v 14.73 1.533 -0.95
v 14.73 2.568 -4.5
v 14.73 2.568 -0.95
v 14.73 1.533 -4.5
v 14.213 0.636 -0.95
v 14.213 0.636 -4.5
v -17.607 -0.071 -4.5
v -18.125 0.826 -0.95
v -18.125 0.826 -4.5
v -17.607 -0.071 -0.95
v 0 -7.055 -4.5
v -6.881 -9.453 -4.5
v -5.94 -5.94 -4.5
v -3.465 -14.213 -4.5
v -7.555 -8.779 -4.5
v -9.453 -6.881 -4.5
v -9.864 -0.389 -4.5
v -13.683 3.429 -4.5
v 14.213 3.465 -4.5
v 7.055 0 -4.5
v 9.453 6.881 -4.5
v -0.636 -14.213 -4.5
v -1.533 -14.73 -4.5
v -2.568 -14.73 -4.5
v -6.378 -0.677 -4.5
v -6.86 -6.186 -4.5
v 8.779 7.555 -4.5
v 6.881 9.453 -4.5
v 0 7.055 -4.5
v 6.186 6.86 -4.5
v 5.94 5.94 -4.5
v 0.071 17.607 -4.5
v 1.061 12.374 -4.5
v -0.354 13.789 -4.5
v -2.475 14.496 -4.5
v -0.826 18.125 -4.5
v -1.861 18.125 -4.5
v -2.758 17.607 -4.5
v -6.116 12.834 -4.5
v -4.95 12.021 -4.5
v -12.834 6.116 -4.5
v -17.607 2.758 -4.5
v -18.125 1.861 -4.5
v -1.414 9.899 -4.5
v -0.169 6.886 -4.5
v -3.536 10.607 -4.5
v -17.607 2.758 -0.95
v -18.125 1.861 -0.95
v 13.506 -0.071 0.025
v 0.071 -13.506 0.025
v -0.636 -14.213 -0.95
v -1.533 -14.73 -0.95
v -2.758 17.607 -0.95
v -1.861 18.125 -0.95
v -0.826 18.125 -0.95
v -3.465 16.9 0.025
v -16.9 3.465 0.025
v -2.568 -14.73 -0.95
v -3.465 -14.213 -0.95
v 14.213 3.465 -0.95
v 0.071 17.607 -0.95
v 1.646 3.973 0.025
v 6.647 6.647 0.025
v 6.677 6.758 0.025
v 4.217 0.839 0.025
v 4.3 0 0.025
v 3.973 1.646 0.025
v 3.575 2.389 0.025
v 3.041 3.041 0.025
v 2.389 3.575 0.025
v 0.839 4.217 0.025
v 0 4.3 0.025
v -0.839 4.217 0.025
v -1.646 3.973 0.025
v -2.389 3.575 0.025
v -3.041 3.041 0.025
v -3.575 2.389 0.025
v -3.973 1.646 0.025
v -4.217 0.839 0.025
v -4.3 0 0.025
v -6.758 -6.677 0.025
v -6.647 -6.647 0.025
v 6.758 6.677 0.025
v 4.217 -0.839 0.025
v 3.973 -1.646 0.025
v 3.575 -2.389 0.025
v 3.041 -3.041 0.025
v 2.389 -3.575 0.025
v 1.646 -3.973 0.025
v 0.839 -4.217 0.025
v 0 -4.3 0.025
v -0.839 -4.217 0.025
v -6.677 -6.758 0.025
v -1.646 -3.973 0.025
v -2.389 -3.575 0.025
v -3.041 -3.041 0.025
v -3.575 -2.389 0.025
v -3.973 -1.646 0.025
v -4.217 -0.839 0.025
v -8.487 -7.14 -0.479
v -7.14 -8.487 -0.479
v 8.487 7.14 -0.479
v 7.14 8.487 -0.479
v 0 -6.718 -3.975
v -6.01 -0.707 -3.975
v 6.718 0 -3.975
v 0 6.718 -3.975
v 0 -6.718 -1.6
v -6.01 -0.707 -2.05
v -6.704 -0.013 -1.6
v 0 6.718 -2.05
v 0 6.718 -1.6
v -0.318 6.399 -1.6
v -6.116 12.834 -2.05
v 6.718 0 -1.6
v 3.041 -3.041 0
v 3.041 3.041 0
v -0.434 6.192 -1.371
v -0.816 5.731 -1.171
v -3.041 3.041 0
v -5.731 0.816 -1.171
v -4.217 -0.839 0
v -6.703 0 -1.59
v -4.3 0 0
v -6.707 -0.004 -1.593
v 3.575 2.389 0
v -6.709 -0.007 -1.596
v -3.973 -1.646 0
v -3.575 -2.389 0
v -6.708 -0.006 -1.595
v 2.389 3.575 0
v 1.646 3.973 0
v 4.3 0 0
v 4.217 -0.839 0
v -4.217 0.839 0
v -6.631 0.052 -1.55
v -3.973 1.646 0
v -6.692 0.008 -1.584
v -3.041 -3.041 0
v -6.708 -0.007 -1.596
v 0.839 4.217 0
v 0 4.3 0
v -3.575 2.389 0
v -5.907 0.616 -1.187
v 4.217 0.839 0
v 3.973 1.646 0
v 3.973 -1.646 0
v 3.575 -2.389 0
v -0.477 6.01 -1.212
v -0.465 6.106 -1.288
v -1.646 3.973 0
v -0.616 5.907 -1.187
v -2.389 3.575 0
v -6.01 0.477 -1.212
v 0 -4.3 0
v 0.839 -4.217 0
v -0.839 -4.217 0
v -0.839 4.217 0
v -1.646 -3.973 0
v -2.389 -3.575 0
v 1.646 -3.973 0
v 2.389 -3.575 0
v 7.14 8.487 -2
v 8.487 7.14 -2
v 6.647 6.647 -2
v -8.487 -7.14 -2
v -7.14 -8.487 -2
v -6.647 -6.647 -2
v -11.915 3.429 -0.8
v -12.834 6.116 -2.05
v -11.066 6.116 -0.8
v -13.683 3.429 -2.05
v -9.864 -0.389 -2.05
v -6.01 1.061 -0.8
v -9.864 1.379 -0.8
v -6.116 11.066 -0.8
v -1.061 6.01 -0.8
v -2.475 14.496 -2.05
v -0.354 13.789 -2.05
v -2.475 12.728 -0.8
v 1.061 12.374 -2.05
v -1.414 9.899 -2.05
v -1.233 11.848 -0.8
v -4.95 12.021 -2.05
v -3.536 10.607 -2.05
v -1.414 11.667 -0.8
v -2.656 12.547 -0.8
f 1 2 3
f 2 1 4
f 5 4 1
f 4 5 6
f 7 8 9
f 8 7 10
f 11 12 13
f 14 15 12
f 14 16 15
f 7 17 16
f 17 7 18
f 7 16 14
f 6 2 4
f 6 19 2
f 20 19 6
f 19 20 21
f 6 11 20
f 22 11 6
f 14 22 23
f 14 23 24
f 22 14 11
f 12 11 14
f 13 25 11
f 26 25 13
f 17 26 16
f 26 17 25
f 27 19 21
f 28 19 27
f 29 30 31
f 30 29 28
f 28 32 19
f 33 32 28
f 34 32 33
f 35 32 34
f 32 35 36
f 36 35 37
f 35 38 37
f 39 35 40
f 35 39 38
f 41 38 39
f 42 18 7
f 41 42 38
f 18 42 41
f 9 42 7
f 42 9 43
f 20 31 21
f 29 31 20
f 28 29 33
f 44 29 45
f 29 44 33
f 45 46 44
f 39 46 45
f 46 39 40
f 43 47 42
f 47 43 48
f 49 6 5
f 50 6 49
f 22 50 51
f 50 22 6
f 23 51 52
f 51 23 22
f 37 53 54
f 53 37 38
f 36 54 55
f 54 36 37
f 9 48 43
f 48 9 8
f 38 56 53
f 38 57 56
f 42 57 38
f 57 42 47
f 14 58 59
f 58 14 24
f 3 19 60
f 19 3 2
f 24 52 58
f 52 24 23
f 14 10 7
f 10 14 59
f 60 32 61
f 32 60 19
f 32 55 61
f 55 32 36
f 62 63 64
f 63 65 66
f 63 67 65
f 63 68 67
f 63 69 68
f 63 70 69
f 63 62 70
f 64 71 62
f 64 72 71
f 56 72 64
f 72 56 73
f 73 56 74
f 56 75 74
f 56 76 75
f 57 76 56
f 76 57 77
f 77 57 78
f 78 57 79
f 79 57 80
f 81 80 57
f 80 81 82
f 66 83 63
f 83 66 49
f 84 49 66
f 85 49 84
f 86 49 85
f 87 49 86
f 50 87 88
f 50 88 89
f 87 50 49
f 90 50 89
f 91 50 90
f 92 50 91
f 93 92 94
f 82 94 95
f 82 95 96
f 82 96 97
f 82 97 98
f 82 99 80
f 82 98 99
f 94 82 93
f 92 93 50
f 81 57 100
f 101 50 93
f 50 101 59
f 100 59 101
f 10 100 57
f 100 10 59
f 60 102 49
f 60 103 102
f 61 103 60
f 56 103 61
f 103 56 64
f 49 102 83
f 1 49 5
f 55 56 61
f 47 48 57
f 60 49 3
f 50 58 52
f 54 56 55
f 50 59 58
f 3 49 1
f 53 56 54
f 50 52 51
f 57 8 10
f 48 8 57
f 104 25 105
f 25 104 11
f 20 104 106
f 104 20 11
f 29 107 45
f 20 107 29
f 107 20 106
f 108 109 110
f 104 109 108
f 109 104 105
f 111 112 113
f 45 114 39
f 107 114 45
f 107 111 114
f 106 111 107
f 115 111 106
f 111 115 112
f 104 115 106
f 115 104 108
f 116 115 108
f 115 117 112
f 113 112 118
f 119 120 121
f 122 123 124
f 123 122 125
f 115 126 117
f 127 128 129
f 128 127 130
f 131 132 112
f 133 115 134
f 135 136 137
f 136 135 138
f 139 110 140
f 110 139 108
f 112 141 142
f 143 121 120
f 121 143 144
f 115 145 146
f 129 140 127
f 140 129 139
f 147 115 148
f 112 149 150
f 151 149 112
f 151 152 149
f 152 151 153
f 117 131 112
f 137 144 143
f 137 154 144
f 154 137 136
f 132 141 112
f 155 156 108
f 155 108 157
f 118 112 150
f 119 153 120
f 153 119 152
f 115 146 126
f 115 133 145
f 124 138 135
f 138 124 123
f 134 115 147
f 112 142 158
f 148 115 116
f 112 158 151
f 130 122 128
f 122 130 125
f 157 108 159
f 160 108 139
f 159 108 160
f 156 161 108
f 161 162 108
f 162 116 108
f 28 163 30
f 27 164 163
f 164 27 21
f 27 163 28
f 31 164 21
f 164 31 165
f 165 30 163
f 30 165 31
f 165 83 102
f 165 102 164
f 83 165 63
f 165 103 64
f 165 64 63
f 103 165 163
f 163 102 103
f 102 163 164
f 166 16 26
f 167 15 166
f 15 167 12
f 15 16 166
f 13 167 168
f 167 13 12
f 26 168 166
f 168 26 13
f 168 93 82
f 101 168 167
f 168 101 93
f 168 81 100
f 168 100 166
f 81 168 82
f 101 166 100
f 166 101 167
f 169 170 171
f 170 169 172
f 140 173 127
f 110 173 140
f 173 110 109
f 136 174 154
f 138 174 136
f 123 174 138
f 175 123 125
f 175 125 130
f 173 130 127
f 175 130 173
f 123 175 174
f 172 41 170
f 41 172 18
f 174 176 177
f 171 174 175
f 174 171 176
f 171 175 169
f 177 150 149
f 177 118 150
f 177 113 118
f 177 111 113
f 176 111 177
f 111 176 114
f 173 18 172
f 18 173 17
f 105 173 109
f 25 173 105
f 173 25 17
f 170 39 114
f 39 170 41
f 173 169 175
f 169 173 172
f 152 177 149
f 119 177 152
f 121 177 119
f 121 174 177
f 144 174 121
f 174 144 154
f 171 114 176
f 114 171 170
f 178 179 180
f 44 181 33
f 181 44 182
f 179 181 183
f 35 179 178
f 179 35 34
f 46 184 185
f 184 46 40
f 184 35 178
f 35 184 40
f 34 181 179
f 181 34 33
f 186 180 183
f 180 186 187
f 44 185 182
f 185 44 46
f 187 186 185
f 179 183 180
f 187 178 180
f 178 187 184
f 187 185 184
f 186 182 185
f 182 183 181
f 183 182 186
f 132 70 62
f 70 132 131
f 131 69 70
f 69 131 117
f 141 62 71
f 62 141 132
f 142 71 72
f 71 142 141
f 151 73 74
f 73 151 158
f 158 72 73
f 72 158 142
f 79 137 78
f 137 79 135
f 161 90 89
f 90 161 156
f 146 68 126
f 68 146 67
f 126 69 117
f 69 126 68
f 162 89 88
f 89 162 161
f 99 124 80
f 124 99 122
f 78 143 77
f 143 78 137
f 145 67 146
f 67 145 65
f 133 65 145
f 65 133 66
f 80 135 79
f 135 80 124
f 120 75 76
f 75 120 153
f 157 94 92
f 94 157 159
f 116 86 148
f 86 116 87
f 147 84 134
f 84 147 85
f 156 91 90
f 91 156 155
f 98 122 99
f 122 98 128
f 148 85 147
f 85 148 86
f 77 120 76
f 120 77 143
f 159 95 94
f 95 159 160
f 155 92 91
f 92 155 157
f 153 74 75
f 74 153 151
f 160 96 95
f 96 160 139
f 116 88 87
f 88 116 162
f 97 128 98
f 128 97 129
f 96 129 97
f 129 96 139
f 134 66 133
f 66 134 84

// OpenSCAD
// file: 6led.scad
/******************************************************************
*                                                                 *
* OpenFlexure Microscope: USB camera push-fit mount               *
*                                                                 *
* This is part of the OpenFlexure microscope, an open-source      *
* microscope and 3-axis translation stage.  It gets really good   *
* precision over a ~10mm range, by using plastic flexure          *
* mechanisms.                                                     *
*                                                                 *
* This file defines one useful function, usbcam_push_fit().  It's *
* designed to be subtracted from a solid block, with the bottom   *
* of the block at z=0.  It grips the plastic camera housing with  *
* a "trylinder" gripper, holding it in securely.  It might be     *
* that you need a cover or something to secure the camera fully.  *
*                                                                 *
* (c) Richard Bowman, January 2016                                *
* Released under the CERN Open Hardware License                   *
*                                                                 *
******************************************************************/


use <../utilities.scad>;
use <./m12.scad>;

// Camera geometry (mostly of the bottom of the lens mount)
lens_holder_tube_r = 13.5/2; // the tube into which the lens screws
lens_holder_tube_h = 12.6; // the height of the tube above the PCB
lens_holder_clearance = 0.35; // extra space around the camera to make sure it fits
lens_holder_box_h = 3.6;
lens_holder_box = [2,2,0] * lens_holder_tube_r + [0,0,1] * lens_holder_box_h; // box at the bottom of the tube
lens_holder_mounting_screw_y = 9; // position of the lugs for mounting screws
lens_holder_mounting_screw_lug_r = 2.2; // size of above.
camera_component_clearance = 1; // it's easiest to have the PCB slightly below the mount

d=0.05; //small distance!
$fn=32;

function 6led_camera_sensor_height() = m12_camera_sensor_height(); //Height of the sensor above the PCB


module 6led_lens_mount(){
    m12_lens_mount();
}


function 6led_camera_mount_height()=m12_camera_mount_height();

module 6led_camera_mount(){ //this is the same as the M12 mount
    m12_camera_mount();
}

    
module 6led_bottom_mounting_posts(height=-1, radius=-1, outers=true, cutouts=true){
    //holes are (28-2.25*2)=23.5mm apart in Y and (33-4.45*2)=24.1mm apart in X
    r = radius > 0 ? radius : 2;
    h = height > 0 ? height : 4;
    rotate(45)
    reflect([1,0,0]) reflect([0,1,0]) translate([24.1/2, 23.5/2, 0]) difference(){
        if(outers) cylinder(r=r, h=h, $fn=12);
        if(cutouts) intersection(){
            translate([0,0,-2]) rotate(75) trylinder_selftap(2, h=h+3);
        }
    }
}

//translate([0,0,-1]) picam_pcb_bottom();
// file: m12.scad
/******************************************************************
*                                                                 *
* OpenFlexure Microscope: USB camera push-fit mount               *
*                                                                 *
* This is part of the OpenFlexure microscope, an open-source      *
* microscope and 3-axis translation stage.  It gets really good   *
* precision over a ~10mm range, by using plastic flexure          *
* mechanisms.                                                     *
*                                                                 *
* This file defines one useful function, usbcam_push_fit().  It's *
* designed to be subtracted from a solid block, with the bottom   *
* of the block at z=0.  It grips the plastic camera housing with  *
* a "trylinder" gripper, holding it in securely.  It might be     *
* that you need a cover or something to secure the camera fully.  *
*                                                                 *
* (c) Richard Bowman, January 2016                                *
* Released under the CERN Open Hardware License                   *
*                                                                 *
******************************************************************/


use <../utilities.scad>;

// Camera geometry (mostly of the bottom of the lens mount)
lens_holder_tube_r = 13.5/2; // the tube into which the lens screws
lens_holder_tube_h = 12.6; // the height of the tube above the PCB
lens_holder_clearance = 0.35; // extra space around the camera to make sure it fits
lens_holder_box_h = 3.6;
lens_holder_box = [2,2,0] * lens_holder_tube_r + [0,0,1] * lens_holder_box_h; // box at the bottom of the tube
lens_holder_mounting_screw_y = 9; // position of the lugs for mounting screws
lens_holder_mounting_screw_lug_r = 2.2; // size of above.
camera_component_clearance = 1; // it's easiest to have the PCB slightly below the mount

d=0.05; //small distance!
$fn=32;

function m12_camera_sensor_height() = 0.5; //Height of the sensor above the PCB


module usbcam_lens_mount(){
    union(){
        cylinder(r=lens_holder_tube_r, h=lens_holder_tube_h, $fn=16);
        translate([0,0,lens_holder_box_h/2]) cube(lens_holder_box, center=true);
        hull() reflect([0,1,0]) translate([0,lens_holder_mounting_screw_y,0]) 
            cylinder(r=lens_holder_mounting_screw_lug_r, h=lens_holder_box_h, $fn=12);
    }
}


function m12_camera_mount_height()=4;

module m12_camera_mount(){
    h = m12_camera_mount_height();
    sy = lens_holder_mounting_screw_y;
    sr = lens_holder_mounting_screw_lug_r+0.5;
    box_w = 13.2 + 1; //make it slightly fatter so it grips the bed more
    sensor_w = 10 + 0.8; //reasonably tight fit around sensor
    solder_w = (box_w-1.2*2); //the solder terminals need some give
    translate([0,0,-h]) difference(){
        linear_extrude(h+d) difference(){
            union(){
                square(box_w, center=true);
                hull() reflect([0,1]) translate([0,sy]) circle(r=sr, $fn=16);
            }
            //screws
            reflect([0,1]) translate([0,sy]) circle(d=1.5, $fn=16);
            //sensor
            //square(sensor_w, center=true);
        }
        //chamfer the screw holes
        reflect([0,1,0]) translate([0,sy,0]){
            cylinder(r1=3, r2=0,h=4, center=true);
            deformable_hole_trylinder(1.5/2,2.1/2,h=12, center=true);
        }
        // enlarge the cut out for the sensor
        // NB the solder terminals will distort the thin bottom, this
        // is intentional, to help with bed adhesion
        cube([sensor_w, sensor_w, 2],center=true);
        sequential_hull(){
            translate([0,0,0.7]) cube([solder_w,solder_w,d],center=true);
            translate([0,0,0.7+(solder_w-sensor_w)/2]) cube([sensor_w, sensor_w, d],center=true);
            translate([0,0,2]) cube([sensor_w, sensor_w, d],center=true);
            translate([0,0,h+d]) cylinder(r=5,h=d);
        }
    }
}
camera_mount();

//translate([0,0,-1]) picam_pcb_bottom();
// file: logitech_c270.scad
/******************************************************************
*                                                                 *
* OpenFlexure Microscope: Logitech C270 screw-on-from-bottm mount *
*                                                                 *
* This is part of the OpenFlexure microscope, an open-source      *
* microscope and 3-axis translation stage.  It gets really good   *
* precision over a ~10mm range, by using plastic flexure          *
* mechanisms.                                                     *
*                                                                 *
* This file defines a camera mount (together with functions that  *
* return the mount height and sensor position) for the Logitech   *
* C270 webcam.                                                    *
*                                                                 *
*                                                                 *
* (c) Richard Bowman, January 2016                                *
* Released under the CERN Open Hardware License                   *
*                                                                 *
******************************************************************/


use <../utilities.scad>;



$fn=48;
d=0.05;


function c270_camera_mount_height() = 4.5;
bottom = c270_camera_mount_height() * -1;
function c270_camera_sensor_height() = 0.2; //Height of the sensor above the PCB

module mounting_hole(){
    translate([0,0,-5]) cylinder(r=0.8*1.2,h=999,$fn=12); 
    translate([0,0,-0.5]) cylinder(r1=0.8*1.2,h=1,r2=0.8*1.2+1,$fn=12);
}

module C270(beam_r=5, beam_h=6){
    //cut-out to fit logitech C270 webcam
    //optical axis at (0,0)
    //top of PCB at (0,0,0)
    mounting_hole_x = 8.25;
    mirror([0,0,1]){ //parts cut out of the mount are z<0
        //beam clearance
        hull(){
            cube([8,8,6],center=true);
            translate([0,0,-beam_h]) cylinder(r=beam_r,h=2*d,center=true);
        }

        //mounting holes
        reflect([1,0,0]) translate([mounting_hole_x,0,0]) mounting_hole(); 
        
        //clearance for PCB
        translate([0,0,0]){
            hull(){
                translate([-10/2,-13.5,0]) cube([10,d,8]);
                translate([-21.5/2,-4,0]) cube([21.5,41,8]);
                translate([-10/2,45,0]) cube([10,d,8]);
            }
            reflect([0,1,0]) hull(){
                translate([-4.5,6,-1.5]) cube([9,7.5,8]);
                translate([-5.5,6,-1.5]) cube([11,6.5,8]);
            }
            difference(){
                hull(){
                    translate([0,22.5,0+4]) cube([20.5,28,15],center=true);
                    translate([0,34,0+4]) cube([10,9.5*2,15],center=true);
                }
                translate([-5,39.5,-999]) mirror([1,0,0]) cube([999,999,999]);
            }
            translate([-6,42.3,0]) mounting_hole();
        }
        
        //exit for cable
        translate([4,20,0]) rotate([-90,0,0]) cylinder(r=3,h=99);
    }
}

module c270_camera_mount(){
    // A mount for the pi camera v2
    // This should finish at z=0+d, with a surface that can be
    // hull-ed onto the lens assembly.
    h = 58;
    w = 25;
    rotate(-45) difference(){
        translate([-w/2, -13, bottom]) cube([w, h, c270_camera_mount_height()]);
        translate([0,0,bottom]) C270();
    }
}
c270_camera_mount();
// file: ../microscope_parameters.scad
/******************************************************************
*                                                                 *
* OpenFlexure Microscope: Microscope Parameters                   *
*                                                                 *
* This is the top-level configuration file for the OpenFlexure    *
* microscope, an open microscope and 3-axis translation stage.    *
* It gets really good precision over a ~10mm range, by using      *
* plastic flexure mechanisms.                                     *
*                                                                 *
* Generally I've tried to put parts (or collections of closely    *
* related parts) in their own files.  However, all the parts      *
* depend on the geometry of the microscope - so these parameters  *
* are gathered together here.  In general, the ones you might     *
* to change are towards the top!  Lower-down ones are defined in  *
* terms of higher-up ones - confusion might arise if you redefine *
* these later...                                                  *
*                                                                 *
* (c) Richard Bowman, January 2016                                *
* Released under the CERN Open Hardware License                   *
*                                                                 *
* http://www.github.com/rwb27/openflexure_microscope              *
* http://www.docubricks.com/projects/openflexure-microscope       *
* http://www.waterscope.org                                       *
*                                                                 *
******************************************************************/

d = 0.05;
$fn=32;

// These are the most useful parameters to change!
big_stage = true; //this option is obsolete and must now always be true...
motor_lugs = true;
endstops = false; //motor_lugs;
version_numstring = "5.20.0-b";
camera = "picamera_2"; //see cameras/camera.scad for valid values
optics = "pilens"; //see optics.scad for valid values
led_r = 5/2; //size of the LED used for illumination
feet_endstops = true;
beamsplitter = false; //enables a cut-out in some optics modules for a beamsplitter


// This sets the basic geometry of the microscope
sample_z = big_stage?65:40; // height of the top of the stage
leg_r = big_stage?30:25; // radius of innermost part of legs (stage size)
hole_r = big_stage?20:10; // size of hole in the stage
xy_lever_ratio = big_stage?4.0/7.0:1.0; // mechanical advantage of actuator over stage - can be used to trade speed and precision
z_lever_ratio = 1.0; // as above, for Z axis (must be >1)
// The variables below affect the position of the objective mount
z_strut_l = big_stage?18:15; //length of struts supporting Z carriage
objective_mount_y = big_stage?18:12; // y position of clip for optics
objective_mount_nose_w = 6; // width of the pointy end of the mount
condenser_clip_w = 14; // width of the dovetail clip for the condenser
foot_height=feet_endstops?15:15; //the endstops need a bit of extra height (or not)

// These variables set the dimensions of flexures
// You might want to tweak them if your material (or printer)
// is different from the ones I've tested, though ABS/PLA extrusion
// is generally fine with my parameters
stage_flex_w = 4; // width of XY axis flexures
zflex_l = 1.5;    // length of (all) flexible bits
zflex_t = 0.75;   // thickness of (all) flexible bits
zflex = [stage_flex_w, zflex_l, zflex_t]; // the above in new-style format
flex_a = 0.15;    // sine of the angle through which flexures can be bent

// Compile a sensible version string
version_string = str("v",version_numstring, big_stage?"-LS":"-SS", sample_z, motor_lugs?"-M":"");
echo(str("Compiling OpenFlexure Microscope ",version_string));

stage_t=5; //thickness of the XY stage (at thickest point, most is 1mm less)
flex_z1 = 0;      // z position of lower flexures for XY axis
flex_z2 = sample_z-stage_t; //height of upper XY flexures
z_strut_t = 6;  // (z) thickness of struts for Z axis
z_flex_w = 4;   // width of struts for Z axis
leg = [4,stage_flex_w,flex_z2+zflex_t]; // size of vertical legs
leg_middle_w = 12; // width of the middle part of each leg
actuator_h = 25; //height of the actuator columns
dz = 0.5; //small increment in Z (~ 2 layers)

leg_outer_w = leg_middle_w + 2*zflex_l + 2*leg[0]; // overall width of parallelogram legs that support the stagef
actuator = [3*1.2+2*2,(flex_z2 - flex_z1)*xy_lever_ratio,6]; // dimensions of the core part of the actuating levers for X and Y - NB should match the column_base_r in compact_nut_seat.scad
actuating_nut_r = (flex_z2 - flex_z1)*xy_lever_ratio; // distance from leg_r to the actuating nut/screw for the XY axes
xy_actuator_travel = actuating_nut_r*0.15; // distance moved by XY axis actuators

// Z axis
z_flexures_z1 = 8; // height of the lower Z flexure
z_flexures_z2 = min(sample_z - 12, 35); // " upper "
objective_mount_back_y = objective_mount_y + 2; //back of objective mount
z_anchor_y = objective_mount_back_y + z_strut_l + 2*zflex[1]; // fixed end of the flexure-hinged lever that actuates the Z axis
z_anchor_w = 20; //width of the Z anchor
zll = (z_strut_l + zflex[1])*z_lever_ratio; //required actuator lever length
zfz = z_flexures_z1; // shorthand for the next line only!
z_nut_y = z_anchor_y - zflex[1]/2 + sqrt(zll*zll - zfz*zfz);
z_actuator_travel = zll*0.15; // distance moved by the Z actuator
z_actuator_tilt = -asin(z_flexures_z1/zll); //angle of the Z actuator

z_flexure_x = (leg_r-zflex_l-max(5,leg[2]*0.1))*sqrt(2); // x position of the outside of the Z-axis static anchors (either side of the XY stage, on the X axis) (no longer used by Z axis but still in use elsewhere.)

bridge_dz = 10; // spacing between thin links on legs
base_t=1; // thickness of the flat base of the structure
wall_h=15; // height of the stiffening vertical(ish) walls
wall_t=2; //thickness of the stiffening walls
zawall_h = z_flexures_z2 - 10; //height of wall near Z anchor
zbwall_h = z_flexures_z2 - 10; //height of bridge over Z lever
illumination_clip_y = (-(leg_r-zflex_l-wall_t/2+leg_outer_w/2)/sqrt(2)
                       -wall_t/2-1); //position of clip for
                      // illumination/back foot.  This is set to
                      // coincide with the wall between the back
                      // two legs. TODO: remove this
illumination_arm_screws = [[20,z_nut_y,sample_z-2],[-20,z_nut_y,sample_z-2], 
                           [0,(leg_r + leg_outer_w)/sqrt(2) + 4,sample_z-2]];
                      // positions of screws that mount the adjustable version of the 
                      // illumination arm
condenser_clip_y = -8; //position of dovetail for old condenser assembly TODO: rename this
base_mounting_holes = [[-20,z_nut_y-4,0],
                       [20,z_nut_y-4,0],
                       [-z_flexure_x-4,big_stage?-8:-4,0],
                       [z_flexure_x+4,big_stage?-8:-4,0]]; 
                       // holes to screw the microscope to a baseplate

endstop_extra_ringheight=feet_endstops?1:0;
endstop_hole_offset=0;
//this is a temporary option to printfeet with smaller travel
//without this with 15mm hole the stage hits the objective
//the stage can move ~3mm in each direction, so the actuator only moves
//~1.7 mm
avoid_objective_xyfoot_offset=xy_actuator_travel-1.8;
// main file
/******************************************************************
*                                                                 *
* OpenFlexure Microscope: Camera mount                            *
*                                                                 *
* This is part of the OpenFlexure microscope, an open-source      *
* microscope and 3-axis translation stage.  It gets really good   *
* precision over a ~10mm range, by using plastic flexure          *
* mechanisms.                                                     *
*                                                                 *
* This file defines the camera mount module, as well as two       *
* functions that return the height of the module and the position *
* of the sensor within that module.  It picks between the various *
* supported cameras using the "camera" variable.                  *
*                                                                 *
*                                                                 *
* (c) Richard Bowman, January 2016                                *
* Released under the CERN Open Hardware License                   *
*                                                                 *
******************************************************************/

include <../microscope_parameters.scad>;
use <logitech_c270.scad>;
use <picamera_2.scad>;
use <m12.scad>;
use <6led.scad>;

// If I was able to selectively include different files, this wouldn't be needed.
// However, doing this saves the faff of precompiling the SCAD source with some
// dodgy ad-hoc script, and is probably the best compromise.  The ternary operator
// is necessary as proper if statements aren't currently allowed in OpenSCAD functions.

// See the function below for valid values of "camera".

function camera_mount_height() =
    // the height of the camera mount - above this comes the optics module.
    camera=="logitech_c270"?c270_camera_mount_height()
    :(camera=="m12"?m12_camera_mount_height()
    :(camera=="6led"?6led_camera_mount_height()
    :picamera_2_camera_mount_height()
    ));
function camera_sensor_height() =
    // the height of the camera mount - above this comes the optics module.
    camera=="logitech_c270"?c270_camera_sensor_height()
    :(camera=="m12"?m12_camera_sensor_height()
    :(camera=="6led"?6led_camera_sensor_height()
    :picamera_2_camera_sensor_height()
    ));
module camera_mount(counterbore=false){
    if(camera=="logitech_c270") c270_camera_mount();
    else if(camera=="m12") m12_camera_mount();
    else if(camera=="6led") 6led_camera_mount();
    else picamera_2_camera_mount(counterbore=counterbore);
}
module camera_bottom_mounting_posts(h=-1, r=-1, outers=true, cutouts=true){
    if(camera=="logitech_c270") c270_bottom_mounting_posts();
    else if(camera=="m12") m12_bottom_mounting_posts();
    else if(camera=="6led") 6led_bottom_mounting_posts(height=h, radius=r, outers=outers, cutouts=cutouts);
    else picamera_2_bottom_mounting_posts(height=h, radius=r, outers=outers, cutouts=cutouts);
}

echo(str("Camera mount height: ",camera_mount_height()));
echo(str("Camera sensor height: ",camera_mount_height()));
camera_mount();
